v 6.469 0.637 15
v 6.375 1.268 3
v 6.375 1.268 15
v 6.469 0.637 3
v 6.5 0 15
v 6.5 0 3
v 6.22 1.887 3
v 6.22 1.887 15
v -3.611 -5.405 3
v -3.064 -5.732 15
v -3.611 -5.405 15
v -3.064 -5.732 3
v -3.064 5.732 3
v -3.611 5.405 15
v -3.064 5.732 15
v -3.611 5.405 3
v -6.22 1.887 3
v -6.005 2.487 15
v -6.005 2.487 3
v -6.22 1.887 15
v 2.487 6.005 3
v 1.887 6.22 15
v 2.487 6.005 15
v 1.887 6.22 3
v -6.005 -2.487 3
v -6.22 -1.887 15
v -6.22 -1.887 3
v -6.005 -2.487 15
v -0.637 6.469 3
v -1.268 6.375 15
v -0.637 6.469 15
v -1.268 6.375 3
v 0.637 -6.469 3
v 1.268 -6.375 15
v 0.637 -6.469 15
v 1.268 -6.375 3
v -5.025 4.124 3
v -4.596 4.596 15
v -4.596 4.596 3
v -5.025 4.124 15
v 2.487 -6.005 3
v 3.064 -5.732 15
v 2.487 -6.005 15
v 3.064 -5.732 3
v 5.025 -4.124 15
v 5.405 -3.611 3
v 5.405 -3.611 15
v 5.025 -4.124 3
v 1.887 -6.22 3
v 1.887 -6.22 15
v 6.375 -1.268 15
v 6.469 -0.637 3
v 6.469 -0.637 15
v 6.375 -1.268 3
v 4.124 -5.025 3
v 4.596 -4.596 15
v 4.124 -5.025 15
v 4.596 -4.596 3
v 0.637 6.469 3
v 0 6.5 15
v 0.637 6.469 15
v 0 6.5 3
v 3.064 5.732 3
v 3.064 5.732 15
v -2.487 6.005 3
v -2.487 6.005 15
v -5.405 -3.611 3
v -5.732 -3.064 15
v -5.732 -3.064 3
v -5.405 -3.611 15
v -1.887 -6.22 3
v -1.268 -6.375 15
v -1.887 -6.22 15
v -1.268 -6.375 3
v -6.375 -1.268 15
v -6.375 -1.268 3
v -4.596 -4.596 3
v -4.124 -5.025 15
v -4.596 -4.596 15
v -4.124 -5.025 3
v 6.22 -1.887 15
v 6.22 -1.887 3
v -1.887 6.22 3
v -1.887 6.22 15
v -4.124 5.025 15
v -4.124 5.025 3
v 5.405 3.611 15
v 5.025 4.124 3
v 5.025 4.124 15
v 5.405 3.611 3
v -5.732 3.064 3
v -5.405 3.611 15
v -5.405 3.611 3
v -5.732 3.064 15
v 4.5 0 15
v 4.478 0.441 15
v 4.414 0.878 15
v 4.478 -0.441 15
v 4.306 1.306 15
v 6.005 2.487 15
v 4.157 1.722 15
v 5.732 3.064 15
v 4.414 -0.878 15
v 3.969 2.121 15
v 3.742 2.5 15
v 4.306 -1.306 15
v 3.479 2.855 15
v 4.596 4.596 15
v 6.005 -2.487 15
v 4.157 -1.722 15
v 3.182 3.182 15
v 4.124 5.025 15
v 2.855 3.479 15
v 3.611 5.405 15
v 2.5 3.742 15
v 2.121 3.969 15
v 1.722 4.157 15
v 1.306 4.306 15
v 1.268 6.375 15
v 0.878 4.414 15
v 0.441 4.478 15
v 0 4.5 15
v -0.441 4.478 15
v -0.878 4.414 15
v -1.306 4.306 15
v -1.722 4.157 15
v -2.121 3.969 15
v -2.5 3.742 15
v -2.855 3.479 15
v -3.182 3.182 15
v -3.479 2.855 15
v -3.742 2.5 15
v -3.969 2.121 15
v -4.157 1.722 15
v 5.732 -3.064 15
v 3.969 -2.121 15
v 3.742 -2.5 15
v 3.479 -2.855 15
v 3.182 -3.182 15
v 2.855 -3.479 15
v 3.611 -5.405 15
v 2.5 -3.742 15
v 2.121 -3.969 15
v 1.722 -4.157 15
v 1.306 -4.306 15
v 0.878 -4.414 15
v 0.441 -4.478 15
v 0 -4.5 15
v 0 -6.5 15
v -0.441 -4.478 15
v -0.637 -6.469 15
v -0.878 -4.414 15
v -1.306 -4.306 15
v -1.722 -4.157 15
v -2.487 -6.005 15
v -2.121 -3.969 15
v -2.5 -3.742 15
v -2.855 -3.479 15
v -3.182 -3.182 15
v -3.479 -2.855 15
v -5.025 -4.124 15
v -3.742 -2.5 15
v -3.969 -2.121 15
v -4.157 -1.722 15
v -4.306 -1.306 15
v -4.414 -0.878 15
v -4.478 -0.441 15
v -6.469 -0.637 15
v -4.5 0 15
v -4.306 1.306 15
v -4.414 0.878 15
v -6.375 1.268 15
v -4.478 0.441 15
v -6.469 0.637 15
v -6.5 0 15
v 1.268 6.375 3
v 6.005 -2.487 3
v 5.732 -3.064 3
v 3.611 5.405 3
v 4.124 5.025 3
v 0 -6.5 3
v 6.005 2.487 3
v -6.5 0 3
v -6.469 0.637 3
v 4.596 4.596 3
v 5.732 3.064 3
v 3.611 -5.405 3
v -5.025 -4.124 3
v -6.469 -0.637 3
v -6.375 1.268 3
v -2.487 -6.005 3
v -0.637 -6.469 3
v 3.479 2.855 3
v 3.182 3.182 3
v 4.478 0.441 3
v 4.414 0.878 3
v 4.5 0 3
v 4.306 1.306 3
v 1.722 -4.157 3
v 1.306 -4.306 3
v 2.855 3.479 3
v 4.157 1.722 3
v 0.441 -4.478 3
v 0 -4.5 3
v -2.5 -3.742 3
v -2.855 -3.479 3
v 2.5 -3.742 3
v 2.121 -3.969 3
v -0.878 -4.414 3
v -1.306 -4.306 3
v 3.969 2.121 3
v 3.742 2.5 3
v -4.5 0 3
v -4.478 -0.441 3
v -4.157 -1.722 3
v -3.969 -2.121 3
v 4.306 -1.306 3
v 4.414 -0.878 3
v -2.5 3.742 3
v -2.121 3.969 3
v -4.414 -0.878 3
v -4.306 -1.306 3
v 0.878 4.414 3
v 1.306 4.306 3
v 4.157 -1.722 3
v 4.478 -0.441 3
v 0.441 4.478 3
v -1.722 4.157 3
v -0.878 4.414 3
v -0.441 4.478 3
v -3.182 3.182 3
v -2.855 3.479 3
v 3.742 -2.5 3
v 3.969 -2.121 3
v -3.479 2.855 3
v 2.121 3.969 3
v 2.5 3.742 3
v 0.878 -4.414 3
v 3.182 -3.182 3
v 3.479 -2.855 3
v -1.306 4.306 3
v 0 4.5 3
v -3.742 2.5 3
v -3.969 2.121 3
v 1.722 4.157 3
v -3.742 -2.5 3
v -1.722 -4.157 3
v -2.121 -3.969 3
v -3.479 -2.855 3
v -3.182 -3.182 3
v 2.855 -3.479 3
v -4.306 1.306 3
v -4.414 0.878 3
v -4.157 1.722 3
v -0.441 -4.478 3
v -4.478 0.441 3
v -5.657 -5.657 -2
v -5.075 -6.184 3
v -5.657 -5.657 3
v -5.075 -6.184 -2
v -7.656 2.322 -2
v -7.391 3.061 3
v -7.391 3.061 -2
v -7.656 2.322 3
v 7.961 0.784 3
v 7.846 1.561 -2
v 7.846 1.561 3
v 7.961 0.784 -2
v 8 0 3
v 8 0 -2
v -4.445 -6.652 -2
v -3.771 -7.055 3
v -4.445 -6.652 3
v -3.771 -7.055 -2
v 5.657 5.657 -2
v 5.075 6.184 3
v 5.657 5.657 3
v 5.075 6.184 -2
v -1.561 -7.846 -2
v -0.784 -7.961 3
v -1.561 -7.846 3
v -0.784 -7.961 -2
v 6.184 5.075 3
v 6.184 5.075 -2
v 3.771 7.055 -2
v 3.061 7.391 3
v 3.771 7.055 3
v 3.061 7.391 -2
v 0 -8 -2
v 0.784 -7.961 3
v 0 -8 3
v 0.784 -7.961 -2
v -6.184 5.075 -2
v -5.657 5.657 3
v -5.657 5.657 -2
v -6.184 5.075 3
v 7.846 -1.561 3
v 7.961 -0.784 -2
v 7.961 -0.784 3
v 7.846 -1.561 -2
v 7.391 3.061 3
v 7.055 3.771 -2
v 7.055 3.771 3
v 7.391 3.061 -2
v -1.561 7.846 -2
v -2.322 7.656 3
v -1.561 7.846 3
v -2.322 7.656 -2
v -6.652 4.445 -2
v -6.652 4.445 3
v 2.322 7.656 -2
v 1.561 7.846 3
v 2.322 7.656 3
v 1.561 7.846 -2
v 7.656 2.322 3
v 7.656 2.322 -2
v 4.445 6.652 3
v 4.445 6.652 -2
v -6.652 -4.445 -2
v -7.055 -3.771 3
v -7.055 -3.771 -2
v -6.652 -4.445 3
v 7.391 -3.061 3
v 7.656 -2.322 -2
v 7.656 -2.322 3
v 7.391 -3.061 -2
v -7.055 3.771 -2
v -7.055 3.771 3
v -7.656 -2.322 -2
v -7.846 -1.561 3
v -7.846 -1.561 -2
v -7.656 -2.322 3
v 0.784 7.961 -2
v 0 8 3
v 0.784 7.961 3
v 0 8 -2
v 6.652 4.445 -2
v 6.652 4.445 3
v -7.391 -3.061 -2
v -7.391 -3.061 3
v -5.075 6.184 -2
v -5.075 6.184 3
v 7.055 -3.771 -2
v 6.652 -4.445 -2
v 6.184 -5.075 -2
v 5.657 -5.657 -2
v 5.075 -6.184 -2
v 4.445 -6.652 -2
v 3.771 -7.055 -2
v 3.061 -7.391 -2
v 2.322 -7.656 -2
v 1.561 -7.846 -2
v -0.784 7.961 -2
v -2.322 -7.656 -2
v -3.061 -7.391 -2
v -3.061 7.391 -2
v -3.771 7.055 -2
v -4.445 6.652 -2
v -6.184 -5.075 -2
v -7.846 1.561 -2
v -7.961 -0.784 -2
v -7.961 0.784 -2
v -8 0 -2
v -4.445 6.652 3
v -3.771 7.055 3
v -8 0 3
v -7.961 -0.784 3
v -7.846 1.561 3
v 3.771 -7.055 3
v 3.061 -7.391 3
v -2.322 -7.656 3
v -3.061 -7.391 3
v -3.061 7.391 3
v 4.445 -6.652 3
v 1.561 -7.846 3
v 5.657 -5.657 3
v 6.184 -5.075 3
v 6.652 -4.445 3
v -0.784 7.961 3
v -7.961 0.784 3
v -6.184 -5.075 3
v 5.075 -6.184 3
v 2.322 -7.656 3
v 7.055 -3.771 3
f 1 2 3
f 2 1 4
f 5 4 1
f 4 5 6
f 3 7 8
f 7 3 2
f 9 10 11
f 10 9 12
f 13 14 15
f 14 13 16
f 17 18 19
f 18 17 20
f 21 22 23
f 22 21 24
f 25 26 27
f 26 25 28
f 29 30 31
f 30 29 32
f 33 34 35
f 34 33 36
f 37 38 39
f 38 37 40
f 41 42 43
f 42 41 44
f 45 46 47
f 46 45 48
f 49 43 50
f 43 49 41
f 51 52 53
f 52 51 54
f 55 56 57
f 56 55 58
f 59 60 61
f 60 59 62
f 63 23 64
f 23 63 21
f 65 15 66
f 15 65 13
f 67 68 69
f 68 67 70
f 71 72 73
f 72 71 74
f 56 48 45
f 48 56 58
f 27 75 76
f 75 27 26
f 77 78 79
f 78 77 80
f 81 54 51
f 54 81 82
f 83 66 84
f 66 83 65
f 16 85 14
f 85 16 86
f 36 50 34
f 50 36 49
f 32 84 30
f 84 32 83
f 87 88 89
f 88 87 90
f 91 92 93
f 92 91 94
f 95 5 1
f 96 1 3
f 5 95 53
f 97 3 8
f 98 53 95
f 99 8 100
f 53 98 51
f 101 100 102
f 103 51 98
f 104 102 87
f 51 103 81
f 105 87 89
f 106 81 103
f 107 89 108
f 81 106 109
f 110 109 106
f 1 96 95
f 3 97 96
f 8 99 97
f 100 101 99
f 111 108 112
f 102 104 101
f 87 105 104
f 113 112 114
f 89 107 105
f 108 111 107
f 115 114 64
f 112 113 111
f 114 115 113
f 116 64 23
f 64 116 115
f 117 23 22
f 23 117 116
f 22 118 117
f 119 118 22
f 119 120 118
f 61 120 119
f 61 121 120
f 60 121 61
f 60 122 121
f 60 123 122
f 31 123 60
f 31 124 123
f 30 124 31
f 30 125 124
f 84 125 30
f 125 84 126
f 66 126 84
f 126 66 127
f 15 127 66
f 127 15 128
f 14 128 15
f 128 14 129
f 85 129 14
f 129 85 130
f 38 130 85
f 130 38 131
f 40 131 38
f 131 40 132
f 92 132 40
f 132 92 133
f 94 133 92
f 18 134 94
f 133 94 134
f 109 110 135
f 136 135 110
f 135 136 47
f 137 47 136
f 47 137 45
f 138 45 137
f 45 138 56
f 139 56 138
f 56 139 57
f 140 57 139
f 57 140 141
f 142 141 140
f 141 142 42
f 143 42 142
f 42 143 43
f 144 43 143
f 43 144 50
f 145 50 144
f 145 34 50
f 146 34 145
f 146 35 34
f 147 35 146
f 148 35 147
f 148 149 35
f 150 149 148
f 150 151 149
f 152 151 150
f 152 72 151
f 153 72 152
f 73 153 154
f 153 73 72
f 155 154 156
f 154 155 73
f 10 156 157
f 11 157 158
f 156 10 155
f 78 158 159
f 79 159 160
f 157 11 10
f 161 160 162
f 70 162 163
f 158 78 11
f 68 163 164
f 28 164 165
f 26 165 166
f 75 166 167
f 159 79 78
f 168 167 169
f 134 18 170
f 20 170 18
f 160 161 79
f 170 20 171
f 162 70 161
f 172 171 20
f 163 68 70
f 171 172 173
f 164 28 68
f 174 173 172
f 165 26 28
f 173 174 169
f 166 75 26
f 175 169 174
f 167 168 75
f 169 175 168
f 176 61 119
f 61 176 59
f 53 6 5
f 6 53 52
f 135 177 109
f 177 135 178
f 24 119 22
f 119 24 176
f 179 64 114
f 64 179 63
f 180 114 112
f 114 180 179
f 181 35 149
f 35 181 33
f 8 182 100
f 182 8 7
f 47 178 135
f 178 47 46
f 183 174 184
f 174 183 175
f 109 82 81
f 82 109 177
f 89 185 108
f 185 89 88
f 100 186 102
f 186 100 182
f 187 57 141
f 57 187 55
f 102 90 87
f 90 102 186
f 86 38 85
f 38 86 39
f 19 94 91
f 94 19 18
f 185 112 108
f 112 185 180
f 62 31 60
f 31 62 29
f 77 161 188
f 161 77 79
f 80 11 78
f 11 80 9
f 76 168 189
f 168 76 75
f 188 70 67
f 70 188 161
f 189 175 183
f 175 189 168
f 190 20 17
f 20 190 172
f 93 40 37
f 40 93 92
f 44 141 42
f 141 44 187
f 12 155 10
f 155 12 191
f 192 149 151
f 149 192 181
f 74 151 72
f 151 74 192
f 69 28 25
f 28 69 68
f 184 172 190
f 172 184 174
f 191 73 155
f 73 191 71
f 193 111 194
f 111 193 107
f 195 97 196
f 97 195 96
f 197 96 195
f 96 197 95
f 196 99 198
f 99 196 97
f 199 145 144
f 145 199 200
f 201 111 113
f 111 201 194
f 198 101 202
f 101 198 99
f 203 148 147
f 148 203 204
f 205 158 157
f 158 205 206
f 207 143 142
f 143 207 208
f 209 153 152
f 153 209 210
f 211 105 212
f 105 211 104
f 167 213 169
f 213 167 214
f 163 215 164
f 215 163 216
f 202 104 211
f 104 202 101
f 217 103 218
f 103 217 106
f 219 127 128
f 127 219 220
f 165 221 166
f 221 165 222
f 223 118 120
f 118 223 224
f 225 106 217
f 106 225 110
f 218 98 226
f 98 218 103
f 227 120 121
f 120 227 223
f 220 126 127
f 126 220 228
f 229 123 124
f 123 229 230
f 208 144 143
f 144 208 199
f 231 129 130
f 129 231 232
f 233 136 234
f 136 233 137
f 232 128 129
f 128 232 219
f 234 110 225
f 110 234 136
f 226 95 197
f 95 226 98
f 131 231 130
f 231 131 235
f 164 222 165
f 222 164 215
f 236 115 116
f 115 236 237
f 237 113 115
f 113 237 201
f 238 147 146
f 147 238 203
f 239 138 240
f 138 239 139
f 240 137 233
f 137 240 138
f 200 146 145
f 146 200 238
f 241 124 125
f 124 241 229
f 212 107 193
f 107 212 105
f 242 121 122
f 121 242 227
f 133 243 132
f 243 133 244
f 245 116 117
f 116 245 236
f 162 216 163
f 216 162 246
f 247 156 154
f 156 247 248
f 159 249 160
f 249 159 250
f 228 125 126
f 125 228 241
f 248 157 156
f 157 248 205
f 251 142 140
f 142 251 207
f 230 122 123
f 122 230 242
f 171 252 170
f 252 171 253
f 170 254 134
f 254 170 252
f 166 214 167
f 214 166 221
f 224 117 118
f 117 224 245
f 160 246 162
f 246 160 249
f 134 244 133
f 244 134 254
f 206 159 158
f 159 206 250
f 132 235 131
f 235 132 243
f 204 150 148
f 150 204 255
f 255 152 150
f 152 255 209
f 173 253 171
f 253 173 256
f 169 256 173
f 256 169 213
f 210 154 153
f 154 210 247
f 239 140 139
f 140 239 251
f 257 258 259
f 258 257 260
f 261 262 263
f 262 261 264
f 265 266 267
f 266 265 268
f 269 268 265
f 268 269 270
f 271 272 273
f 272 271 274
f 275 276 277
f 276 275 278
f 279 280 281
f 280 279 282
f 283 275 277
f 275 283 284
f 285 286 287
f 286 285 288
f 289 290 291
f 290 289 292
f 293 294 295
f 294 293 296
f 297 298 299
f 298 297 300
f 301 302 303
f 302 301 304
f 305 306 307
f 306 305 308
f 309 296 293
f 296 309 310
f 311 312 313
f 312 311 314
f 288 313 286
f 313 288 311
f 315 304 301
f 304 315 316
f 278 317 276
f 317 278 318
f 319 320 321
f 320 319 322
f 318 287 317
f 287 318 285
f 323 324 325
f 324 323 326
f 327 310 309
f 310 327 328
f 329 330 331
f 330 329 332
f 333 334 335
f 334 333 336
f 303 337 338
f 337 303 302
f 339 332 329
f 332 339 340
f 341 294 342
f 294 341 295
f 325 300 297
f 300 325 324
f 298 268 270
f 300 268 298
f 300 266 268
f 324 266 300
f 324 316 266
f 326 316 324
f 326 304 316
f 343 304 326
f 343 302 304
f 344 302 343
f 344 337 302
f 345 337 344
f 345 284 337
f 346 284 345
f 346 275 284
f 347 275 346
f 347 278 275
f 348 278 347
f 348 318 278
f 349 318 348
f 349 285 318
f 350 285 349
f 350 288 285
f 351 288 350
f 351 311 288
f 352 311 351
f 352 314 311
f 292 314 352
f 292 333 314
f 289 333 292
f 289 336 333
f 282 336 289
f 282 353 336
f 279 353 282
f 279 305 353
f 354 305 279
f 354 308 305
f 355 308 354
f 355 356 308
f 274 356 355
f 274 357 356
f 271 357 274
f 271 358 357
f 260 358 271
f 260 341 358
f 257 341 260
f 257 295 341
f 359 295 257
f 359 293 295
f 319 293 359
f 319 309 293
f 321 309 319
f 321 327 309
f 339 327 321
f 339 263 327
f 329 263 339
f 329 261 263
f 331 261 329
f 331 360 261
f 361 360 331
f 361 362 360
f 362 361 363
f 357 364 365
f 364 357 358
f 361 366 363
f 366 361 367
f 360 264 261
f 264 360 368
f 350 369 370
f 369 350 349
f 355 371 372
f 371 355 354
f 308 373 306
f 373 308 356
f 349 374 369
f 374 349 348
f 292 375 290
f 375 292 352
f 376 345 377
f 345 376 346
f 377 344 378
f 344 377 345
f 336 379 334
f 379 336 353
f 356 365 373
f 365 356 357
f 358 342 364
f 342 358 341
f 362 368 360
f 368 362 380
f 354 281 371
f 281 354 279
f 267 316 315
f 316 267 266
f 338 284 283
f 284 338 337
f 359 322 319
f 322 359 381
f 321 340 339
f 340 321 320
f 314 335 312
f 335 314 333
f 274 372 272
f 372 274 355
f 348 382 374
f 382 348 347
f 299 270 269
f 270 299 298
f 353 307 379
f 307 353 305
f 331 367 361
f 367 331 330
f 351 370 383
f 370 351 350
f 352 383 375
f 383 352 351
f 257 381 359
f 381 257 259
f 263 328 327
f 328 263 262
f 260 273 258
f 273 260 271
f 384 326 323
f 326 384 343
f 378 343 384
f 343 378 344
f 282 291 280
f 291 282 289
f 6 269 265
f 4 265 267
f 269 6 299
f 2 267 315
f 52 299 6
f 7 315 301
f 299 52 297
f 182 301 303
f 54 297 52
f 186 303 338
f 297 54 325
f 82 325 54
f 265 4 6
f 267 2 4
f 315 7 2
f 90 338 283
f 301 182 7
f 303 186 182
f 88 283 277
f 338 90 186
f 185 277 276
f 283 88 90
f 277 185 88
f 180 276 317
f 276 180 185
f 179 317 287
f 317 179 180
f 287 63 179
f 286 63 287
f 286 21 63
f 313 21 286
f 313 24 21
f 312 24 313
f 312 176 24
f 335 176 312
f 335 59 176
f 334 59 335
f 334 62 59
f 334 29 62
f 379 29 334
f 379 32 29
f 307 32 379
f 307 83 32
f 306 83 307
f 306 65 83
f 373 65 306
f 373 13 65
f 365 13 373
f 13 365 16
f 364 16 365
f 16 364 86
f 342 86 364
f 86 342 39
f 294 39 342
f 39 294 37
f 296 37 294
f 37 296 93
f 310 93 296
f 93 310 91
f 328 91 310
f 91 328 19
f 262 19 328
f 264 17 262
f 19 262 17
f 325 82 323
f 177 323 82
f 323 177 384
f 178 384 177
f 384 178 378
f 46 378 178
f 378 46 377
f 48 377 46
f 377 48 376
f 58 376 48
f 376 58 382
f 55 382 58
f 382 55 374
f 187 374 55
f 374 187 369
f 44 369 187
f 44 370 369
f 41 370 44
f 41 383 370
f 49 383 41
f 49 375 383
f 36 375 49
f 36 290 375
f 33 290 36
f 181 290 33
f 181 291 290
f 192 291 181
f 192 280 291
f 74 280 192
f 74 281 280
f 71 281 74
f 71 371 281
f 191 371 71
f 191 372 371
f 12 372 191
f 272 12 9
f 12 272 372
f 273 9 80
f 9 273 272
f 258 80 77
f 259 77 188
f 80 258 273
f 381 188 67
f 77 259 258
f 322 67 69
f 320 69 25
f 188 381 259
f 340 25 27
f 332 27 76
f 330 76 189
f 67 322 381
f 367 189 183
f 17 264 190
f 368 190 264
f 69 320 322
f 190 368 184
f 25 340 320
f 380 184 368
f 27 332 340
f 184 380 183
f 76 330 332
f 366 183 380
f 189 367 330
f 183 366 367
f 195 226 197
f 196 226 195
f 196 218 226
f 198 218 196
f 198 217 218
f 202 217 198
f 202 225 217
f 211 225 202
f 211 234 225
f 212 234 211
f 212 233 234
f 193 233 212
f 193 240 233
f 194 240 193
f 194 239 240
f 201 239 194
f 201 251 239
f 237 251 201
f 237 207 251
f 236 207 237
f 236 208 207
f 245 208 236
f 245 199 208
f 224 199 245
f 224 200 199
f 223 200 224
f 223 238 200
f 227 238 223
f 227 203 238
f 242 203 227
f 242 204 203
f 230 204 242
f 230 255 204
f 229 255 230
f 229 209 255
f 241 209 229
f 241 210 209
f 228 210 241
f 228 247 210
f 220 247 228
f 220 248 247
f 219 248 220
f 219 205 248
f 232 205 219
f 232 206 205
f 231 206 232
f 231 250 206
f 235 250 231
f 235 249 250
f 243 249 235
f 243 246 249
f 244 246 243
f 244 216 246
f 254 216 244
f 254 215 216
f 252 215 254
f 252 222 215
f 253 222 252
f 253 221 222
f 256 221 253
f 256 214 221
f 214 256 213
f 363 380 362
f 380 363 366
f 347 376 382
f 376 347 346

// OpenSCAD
/*
*  Name: rod_ends.scad
*  Description: caps to be plugged to the end of rods
*  Author: Anhtien Nguyen
*  Date: June 12, 2018
*/

// diameter of the rod
diameter=8;
rad =diameter/2;
// clearance between rod & inner wall
gap=0.5; 
// wall thickness between inner & outter wall
thickness=2; 
// rod end height
height=15; 
// enter zero here if base not needed
base_diameter=16;
base_radius=base_diameter/2;
//  base height
base_height=5;

cap();

module cap(rad = rad+gap,thick=thickness,height=height, base_height=base_height, base_radius=base_radius) {
    
    shiftdown = thick > base_height?  base_height :thick;
    difference() {
        // outter circle
    cylinder(r=rad+thick,h=height,$fn=64);
        // inner circle
    translate([0,0,thick]) cylinder(r=rad,h=height,$fn=64);
    }
    
    // add the base
    if (base_height >0 && base_radius>0)
    {
        translate([0,0,-shiftdown]) cylinder(r=base_radius, h=base_height,$fn=64);
    }
    
}
    
